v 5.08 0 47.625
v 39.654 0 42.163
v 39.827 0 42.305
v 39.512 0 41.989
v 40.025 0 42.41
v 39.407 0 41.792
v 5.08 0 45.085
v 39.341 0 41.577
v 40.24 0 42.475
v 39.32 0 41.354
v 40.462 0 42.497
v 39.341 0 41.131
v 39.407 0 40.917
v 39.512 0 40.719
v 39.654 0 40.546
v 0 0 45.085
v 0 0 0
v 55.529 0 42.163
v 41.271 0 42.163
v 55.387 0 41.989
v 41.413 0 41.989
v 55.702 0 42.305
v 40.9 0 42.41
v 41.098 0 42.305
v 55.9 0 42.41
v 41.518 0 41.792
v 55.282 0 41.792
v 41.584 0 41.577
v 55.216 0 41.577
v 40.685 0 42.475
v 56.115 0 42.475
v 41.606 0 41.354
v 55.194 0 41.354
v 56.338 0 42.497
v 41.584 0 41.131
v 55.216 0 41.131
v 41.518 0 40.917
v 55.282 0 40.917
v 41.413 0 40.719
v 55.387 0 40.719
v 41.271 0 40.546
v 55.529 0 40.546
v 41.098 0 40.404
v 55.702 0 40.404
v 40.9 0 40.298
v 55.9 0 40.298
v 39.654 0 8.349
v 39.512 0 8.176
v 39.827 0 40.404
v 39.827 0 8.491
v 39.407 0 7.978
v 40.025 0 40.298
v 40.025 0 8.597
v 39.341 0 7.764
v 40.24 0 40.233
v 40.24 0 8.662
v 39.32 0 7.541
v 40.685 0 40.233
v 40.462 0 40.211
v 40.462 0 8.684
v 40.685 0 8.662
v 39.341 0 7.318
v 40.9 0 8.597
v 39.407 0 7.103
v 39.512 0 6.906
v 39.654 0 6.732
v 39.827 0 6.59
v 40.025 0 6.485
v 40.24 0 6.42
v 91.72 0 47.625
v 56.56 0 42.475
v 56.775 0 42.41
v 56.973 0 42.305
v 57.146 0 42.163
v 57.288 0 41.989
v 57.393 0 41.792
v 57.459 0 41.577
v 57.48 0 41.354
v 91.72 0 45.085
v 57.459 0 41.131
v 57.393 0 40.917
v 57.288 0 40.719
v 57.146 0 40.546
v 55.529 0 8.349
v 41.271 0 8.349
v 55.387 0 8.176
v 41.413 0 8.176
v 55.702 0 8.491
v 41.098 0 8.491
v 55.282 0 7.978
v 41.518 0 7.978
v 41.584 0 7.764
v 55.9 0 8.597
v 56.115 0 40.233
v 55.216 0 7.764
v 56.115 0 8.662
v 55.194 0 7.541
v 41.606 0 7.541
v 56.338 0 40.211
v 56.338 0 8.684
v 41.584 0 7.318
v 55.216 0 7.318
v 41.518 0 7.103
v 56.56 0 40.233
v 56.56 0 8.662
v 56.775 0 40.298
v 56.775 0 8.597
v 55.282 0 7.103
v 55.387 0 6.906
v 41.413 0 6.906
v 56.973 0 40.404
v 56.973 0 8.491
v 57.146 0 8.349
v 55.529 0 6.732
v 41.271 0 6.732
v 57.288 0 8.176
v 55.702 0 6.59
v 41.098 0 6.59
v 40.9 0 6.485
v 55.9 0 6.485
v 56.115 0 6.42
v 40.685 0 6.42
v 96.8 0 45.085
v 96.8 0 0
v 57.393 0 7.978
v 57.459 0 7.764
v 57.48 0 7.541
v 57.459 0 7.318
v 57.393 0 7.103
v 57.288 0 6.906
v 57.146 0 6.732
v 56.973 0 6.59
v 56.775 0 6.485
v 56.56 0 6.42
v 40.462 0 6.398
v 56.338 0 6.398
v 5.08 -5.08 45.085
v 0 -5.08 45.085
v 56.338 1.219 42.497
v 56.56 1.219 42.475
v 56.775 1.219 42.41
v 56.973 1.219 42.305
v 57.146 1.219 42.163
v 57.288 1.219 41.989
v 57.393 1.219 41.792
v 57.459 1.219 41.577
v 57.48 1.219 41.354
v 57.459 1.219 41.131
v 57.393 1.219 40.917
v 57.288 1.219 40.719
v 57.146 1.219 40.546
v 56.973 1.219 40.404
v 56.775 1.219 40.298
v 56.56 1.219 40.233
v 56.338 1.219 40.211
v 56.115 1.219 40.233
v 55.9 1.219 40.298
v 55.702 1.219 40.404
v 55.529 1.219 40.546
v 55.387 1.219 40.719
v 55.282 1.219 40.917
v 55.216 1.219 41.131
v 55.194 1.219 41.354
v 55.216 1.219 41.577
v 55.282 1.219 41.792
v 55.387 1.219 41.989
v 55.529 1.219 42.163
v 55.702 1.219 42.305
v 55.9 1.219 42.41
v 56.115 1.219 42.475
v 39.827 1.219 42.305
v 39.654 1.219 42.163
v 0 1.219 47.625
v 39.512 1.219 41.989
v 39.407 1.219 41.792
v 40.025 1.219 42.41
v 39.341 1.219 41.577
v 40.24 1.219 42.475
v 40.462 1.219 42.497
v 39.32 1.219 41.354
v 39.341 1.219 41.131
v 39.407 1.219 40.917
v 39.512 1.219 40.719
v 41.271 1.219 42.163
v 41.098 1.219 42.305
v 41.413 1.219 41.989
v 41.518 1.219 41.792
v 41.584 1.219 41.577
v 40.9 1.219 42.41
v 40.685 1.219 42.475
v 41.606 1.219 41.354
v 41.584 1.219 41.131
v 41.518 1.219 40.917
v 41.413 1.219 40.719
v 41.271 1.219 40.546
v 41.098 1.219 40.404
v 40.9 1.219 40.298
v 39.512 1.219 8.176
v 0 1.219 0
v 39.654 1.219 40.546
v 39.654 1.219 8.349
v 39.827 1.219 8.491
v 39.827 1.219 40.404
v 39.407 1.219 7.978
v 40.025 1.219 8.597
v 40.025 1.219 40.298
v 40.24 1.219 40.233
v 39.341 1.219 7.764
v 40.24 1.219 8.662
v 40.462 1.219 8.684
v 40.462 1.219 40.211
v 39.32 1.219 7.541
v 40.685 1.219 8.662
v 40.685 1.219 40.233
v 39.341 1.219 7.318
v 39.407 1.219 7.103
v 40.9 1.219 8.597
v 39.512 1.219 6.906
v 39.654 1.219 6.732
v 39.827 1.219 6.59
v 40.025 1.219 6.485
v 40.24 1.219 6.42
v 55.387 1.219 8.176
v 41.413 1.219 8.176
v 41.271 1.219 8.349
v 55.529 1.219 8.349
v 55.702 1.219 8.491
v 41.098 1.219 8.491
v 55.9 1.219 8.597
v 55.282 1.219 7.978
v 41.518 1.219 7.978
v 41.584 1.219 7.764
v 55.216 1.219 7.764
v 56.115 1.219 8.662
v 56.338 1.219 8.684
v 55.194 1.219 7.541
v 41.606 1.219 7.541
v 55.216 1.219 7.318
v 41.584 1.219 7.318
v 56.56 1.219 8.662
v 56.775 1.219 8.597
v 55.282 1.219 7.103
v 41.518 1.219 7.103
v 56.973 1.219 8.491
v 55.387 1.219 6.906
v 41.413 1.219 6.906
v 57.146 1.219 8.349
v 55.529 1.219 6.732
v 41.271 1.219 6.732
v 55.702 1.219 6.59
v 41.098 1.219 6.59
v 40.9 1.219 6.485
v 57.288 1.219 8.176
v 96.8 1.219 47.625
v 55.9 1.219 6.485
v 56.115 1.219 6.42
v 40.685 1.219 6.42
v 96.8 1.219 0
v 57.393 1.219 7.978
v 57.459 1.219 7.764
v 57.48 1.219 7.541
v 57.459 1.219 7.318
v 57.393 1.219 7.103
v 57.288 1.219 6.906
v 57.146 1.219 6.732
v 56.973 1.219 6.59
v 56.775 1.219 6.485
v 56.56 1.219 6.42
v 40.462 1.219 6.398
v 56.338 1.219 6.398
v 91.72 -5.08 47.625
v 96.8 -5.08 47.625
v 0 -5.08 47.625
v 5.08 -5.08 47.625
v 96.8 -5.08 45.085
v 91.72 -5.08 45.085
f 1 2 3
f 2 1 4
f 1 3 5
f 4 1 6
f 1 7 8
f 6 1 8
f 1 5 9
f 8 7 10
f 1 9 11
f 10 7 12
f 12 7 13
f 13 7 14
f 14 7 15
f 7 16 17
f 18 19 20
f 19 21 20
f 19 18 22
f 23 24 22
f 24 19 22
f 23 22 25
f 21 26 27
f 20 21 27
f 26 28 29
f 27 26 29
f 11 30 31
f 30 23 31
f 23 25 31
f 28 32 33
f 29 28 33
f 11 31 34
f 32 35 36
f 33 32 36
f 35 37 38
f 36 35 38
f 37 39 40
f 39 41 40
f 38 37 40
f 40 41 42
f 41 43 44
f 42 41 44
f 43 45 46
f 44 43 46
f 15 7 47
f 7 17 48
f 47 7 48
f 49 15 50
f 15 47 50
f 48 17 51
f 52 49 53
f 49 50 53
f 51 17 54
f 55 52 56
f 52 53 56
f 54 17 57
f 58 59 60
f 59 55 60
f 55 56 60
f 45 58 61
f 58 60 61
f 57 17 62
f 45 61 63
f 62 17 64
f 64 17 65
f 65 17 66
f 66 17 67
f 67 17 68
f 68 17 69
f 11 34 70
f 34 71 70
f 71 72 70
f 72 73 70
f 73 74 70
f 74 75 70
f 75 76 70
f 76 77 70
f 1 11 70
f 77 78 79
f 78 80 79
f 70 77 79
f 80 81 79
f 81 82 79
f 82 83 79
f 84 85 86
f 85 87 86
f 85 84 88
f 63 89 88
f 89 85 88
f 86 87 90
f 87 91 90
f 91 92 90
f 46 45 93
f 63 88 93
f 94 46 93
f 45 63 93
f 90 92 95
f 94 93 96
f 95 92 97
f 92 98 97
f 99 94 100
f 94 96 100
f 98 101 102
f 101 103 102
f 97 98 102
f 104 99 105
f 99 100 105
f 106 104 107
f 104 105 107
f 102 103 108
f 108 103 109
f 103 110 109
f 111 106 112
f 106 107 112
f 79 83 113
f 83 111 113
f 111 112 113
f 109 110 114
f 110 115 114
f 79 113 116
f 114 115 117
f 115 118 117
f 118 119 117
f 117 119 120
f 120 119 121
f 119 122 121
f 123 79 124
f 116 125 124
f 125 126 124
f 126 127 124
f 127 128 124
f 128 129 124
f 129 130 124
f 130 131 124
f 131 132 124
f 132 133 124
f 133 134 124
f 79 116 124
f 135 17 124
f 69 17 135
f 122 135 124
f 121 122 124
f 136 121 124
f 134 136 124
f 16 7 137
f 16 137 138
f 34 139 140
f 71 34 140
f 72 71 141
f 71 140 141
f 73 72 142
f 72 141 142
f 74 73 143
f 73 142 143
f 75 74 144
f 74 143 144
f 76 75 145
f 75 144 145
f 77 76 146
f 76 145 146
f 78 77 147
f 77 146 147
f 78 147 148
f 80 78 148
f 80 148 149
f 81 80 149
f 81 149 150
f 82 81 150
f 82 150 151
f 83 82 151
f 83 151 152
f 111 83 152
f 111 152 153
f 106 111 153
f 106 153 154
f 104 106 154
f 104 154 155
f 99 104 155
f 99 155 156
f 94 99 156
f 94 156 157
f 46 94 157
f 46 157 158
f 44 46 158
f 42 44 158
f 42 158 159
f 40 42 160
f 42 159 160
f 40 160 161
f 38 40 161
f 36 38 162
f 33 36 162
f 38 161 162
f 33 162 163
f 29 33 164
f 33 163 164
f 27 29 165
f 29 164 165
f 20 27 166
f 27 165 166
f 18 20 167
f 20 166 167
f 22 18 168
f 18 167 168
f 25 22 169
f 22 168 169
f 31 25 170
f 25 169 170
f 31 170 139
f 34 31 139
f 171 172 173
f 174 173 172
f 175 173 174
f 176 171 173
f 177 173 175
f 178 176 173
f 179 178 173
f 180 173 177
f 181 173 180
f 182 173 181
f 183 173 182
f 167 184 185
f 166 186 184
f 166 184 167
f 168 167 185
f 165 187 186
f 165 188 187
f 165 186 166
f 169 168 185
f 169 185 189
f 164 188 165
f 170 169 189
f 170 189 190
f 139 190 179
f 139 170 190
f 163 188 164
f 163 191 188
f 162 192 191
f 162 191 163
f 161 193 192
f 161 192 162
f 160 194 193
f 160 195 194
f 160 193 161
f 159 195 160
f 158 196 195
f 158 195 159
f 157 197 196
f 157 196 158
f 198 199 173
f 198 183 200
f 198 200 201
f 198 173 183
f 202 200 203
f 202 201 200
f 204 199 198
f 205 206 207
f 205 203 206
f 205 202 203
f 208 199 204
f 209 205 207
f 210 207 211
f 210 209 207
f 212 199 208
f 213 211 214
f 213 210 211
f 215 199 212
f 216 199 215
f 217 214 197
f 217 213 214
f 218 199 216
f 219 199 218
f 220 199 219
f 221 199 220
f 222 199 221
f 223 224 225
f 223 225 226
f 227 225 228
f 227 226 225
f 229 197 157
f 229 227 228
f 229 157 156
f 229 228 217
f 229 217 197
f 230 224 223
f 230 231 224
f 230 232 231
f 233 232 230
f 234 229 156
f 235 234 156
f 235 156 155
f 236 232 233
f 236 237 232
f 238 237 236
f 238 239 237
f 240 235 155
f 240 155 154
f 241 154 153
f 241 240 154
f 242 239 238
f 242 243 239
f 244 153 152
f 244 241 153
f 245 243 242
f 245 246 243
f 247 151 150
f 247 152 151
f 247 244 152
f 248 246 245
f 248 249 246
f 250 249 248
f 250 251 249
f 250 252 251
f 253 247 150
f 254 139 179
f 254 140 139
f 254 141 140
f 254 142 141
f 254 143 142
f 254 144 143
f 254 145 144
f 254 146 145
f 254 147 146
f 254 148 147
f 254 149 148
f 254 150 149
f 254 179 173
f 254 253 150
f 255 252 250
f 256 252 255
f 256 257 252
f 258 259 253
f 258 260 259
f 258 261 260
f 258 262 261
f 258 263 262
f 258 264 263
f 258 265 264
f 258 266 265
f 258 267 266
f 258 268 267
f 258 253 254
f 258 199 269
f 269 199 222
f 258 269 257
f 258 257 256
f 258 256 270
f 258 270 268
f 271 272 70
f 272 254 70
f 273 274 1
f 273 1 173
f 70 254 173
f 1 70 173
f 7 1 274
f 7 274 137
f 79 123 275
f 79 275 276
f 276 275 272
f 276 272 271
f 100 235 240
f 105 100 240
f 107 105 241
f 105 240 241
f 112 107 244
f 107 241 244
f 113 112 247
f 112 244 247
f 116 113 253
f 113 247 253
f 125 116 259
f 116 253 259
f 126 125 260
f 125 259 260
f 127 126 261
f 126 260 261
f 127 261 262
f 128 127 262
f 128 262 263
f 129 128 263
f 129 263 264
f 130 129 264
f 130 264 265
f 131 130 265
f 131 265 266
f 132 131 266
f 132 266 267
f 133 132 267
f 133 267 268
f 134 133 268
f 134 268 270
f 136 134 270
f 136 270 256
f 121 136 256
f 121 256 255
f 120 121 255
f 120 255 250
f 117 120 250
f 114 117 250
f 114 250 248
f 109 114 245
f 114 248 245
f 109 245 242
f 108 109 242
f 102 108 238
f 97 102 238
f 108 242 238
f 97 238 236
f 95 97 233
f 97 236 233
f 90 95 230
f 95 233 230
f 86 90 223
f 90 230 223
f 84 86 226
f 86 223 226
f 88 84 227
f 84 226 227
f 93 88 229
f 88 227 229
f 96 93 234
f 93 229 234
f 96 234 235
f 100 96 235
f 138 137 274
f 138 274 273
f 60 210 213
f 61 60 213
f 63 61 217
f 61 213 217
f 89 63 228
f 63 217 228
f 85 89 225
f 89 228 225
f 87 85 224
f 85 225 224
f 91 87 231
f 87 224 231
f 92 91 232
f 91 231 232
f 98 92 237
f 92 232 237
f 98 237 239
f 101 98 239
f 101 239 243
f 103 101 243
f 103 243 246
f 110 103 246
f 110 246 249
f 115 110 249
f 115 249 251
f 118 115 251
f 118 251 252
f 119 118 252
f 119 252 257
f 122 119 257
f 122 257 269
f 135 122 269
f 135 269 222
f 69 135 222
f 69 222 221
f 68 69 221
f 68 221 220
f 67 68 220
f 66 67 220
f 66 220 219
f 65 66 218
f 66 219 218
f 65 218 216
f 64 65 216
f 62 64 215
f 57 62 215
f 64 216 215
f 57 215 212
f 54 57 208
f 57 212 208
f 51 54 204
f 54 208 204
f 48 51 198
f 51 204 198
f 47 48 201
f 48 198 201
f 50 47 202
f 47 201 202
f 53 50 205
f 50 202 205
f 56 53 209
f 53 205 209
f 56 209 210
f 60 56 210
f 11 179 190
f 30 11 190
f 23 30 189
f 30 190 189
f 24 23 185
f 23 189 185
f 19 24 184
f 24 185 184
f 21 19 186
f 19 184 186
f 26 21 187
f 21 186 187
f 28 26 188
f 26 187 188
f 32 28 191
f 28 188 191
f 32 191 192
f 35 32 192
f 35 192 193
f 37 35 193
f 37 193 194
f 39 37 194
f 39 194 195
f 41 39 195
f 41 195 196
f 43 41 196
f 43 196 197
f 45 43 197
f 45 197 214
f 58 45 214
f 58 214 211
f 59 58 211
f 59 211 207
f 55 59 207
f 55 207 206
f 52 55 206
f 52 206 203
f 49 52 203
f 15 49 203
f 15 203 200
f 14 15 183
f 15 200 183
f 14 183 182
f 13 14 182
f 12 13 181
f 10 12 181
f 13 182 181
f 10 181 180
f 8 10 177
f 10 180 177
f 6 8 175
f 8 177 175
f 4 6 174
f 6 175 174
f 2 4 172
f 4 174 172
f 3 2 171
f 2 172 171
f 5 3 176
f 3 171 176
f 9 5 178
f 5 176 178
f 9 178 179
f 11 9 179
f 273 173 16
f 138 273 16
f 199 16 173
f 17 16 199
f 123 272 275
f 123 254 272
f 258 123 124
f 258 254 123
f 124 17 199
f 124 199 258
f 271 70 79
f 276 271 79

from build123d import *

# Parameters (mm, degrees)
SKETCH1_W           = 96.799999948
SKETCH1_H           = 47.62500254
BOSS_EXTRUDE1_DEPTH = 1.2192
CUT_EXTRUDE1_REACH  = 109.888
SKETCH5_R           = 1.143
CUT_EXTRUDE2_REACH  = 109.888
SKETCH6_R           = 1.143
SKETCH7_W           = 5.08
SKETCH7_H           = 2.54
BOSS_EXTRUDE2_DEPTH = 5.08


with BuildPart() as part:
    # Sketch1 → Boss-Extrude1 (new body)
    with BuildSketch(Plane(origin=(0, 0, 0), x_dir=(1, 0, 0), z_dir=(0, 1, 0))):
        with Locations((48.399999974, -23.81250127)):
            Rectangle(SKETCH1_W, SKETCH1_H)
    extrude(amount=BOSS_EXTRUDE1_DEPTH)

    # Sketch5 → Cut-Extrude1 (cut, up to next)
    with BuildSketch(Plane(origin=(0, 1.2192, 0), x_dir=(1, 0, 0), z_dir=(0, 1, 0)), mode=Mode.PRIVATE) as cut_extrude1_sk1:
        with Locations(Location((56.3375, -7.540625, 0), (0, 0, 270))):
            Circle(SKETCH5_R)
    cut_extrude1_tool1 = extrude(cut_extrude1_sk1.sketch, amount=-CUT_EXTRUDE1_REACH, mode=Mode.PRIVATE) & part.part
    # Sketch5 → Cut-Extrude1 (cut, up to next)
    with BuildSketch(Plane(origin=(0, 1.2192, 0), x_dir=(1, 0, 0), z_dir=(0, 1, 0)), mode=Mode.PRIVATE) as cut_extrude1_sk2:
        with Locations(Location((40.4625, -7.540625, 0), (0, 0, 270))):
            Circle(SKETCH5_R)
    cut_extrude1_tool2 = extrude(cut_extrude1_sk2.sketch, amount=-CUT_EXTRUDE1_REACH, mode=Mode.PRIVATE) & part.part
    add(cut_extrude1_tool1.solids().sort_by_distance((56.3375, 1.2192, 7.540625))[0], mode=Mode.SUBTRACT)
    add(cut_extrude1_tool2.solids().sort_by_distance((40.4625, 1.2192, 7.540625))[0], mode=Mode.SUBTRACT)

    # Sketch6 → Cut-Extrude2 (cut, up to next)
    with BuildSketch(Plane(origin=(0, 1.2192, 0), x_dir=(1, 0, 0), z_dir=(0, 1, 0)), mode=Mode.PRIVATE) as cut_extrude2_sk1:
        with Locations(Location((56.3375, -41.35437754, 0), (0, 0, 270))):
            Circle(SKETCH6_R)
    cut_extrude2_tool1 = extrude(cut_extrude2_sk1.sketch, amount=-CUT_EXTRUDE2_REACH, mode=Mode.PRIVATE) & part.part
    # Sketch6 → Cut-Extrude2 (cut, up to next)
    with BuildSketch(Plane(origin=(0, 1.2192, 0), x_dir=(1, 0, 0), z_dir=(0, 1, 0)), mode=Mode.PRIVATE) as cut_extrude2_sk2:
        with Locations(Location((40.4625, -41.35437754, 0), (0, 0, 270))):
            Circle(SKETCH6_R)
    cut_extrude2_tool2 = extrude(cut_extrude2_sk2.sketch, amount=-CUT_EXTRUDE2_REACH, mode=Mode.PRIVATE) & part.part
    add(cut_extrude2_tool1.solids().sort_by_distance((56.3375, 1.2192, 41.354378))[0], mode=Mode.SUBTRACT)
    add(cut_extrude2_tool2.solids().sort_by_distance((40.4625, 1.2192, 41.354378))[0], mode=Mode.SUBTRACT)

    # Sketch7 → Boss-Extrude2 (add)
    with BuildSketch(Plane(origin=(0, 0, 0), x_dir=(-1, 0, 0), z_dir=(0, -1, 0))):
        with Locations((-94.259999948, -46.35500254)):
            Rectangle(SKETCH7_W, SKETCH7_H)
        with Locations((-2.54, -46.35500254)):
            Rectangle(SKETCH7_W, SKETCH7_H)
    extrude(amount=BOSS_EXTRUDE2_DEPTH)


solid = part.part
